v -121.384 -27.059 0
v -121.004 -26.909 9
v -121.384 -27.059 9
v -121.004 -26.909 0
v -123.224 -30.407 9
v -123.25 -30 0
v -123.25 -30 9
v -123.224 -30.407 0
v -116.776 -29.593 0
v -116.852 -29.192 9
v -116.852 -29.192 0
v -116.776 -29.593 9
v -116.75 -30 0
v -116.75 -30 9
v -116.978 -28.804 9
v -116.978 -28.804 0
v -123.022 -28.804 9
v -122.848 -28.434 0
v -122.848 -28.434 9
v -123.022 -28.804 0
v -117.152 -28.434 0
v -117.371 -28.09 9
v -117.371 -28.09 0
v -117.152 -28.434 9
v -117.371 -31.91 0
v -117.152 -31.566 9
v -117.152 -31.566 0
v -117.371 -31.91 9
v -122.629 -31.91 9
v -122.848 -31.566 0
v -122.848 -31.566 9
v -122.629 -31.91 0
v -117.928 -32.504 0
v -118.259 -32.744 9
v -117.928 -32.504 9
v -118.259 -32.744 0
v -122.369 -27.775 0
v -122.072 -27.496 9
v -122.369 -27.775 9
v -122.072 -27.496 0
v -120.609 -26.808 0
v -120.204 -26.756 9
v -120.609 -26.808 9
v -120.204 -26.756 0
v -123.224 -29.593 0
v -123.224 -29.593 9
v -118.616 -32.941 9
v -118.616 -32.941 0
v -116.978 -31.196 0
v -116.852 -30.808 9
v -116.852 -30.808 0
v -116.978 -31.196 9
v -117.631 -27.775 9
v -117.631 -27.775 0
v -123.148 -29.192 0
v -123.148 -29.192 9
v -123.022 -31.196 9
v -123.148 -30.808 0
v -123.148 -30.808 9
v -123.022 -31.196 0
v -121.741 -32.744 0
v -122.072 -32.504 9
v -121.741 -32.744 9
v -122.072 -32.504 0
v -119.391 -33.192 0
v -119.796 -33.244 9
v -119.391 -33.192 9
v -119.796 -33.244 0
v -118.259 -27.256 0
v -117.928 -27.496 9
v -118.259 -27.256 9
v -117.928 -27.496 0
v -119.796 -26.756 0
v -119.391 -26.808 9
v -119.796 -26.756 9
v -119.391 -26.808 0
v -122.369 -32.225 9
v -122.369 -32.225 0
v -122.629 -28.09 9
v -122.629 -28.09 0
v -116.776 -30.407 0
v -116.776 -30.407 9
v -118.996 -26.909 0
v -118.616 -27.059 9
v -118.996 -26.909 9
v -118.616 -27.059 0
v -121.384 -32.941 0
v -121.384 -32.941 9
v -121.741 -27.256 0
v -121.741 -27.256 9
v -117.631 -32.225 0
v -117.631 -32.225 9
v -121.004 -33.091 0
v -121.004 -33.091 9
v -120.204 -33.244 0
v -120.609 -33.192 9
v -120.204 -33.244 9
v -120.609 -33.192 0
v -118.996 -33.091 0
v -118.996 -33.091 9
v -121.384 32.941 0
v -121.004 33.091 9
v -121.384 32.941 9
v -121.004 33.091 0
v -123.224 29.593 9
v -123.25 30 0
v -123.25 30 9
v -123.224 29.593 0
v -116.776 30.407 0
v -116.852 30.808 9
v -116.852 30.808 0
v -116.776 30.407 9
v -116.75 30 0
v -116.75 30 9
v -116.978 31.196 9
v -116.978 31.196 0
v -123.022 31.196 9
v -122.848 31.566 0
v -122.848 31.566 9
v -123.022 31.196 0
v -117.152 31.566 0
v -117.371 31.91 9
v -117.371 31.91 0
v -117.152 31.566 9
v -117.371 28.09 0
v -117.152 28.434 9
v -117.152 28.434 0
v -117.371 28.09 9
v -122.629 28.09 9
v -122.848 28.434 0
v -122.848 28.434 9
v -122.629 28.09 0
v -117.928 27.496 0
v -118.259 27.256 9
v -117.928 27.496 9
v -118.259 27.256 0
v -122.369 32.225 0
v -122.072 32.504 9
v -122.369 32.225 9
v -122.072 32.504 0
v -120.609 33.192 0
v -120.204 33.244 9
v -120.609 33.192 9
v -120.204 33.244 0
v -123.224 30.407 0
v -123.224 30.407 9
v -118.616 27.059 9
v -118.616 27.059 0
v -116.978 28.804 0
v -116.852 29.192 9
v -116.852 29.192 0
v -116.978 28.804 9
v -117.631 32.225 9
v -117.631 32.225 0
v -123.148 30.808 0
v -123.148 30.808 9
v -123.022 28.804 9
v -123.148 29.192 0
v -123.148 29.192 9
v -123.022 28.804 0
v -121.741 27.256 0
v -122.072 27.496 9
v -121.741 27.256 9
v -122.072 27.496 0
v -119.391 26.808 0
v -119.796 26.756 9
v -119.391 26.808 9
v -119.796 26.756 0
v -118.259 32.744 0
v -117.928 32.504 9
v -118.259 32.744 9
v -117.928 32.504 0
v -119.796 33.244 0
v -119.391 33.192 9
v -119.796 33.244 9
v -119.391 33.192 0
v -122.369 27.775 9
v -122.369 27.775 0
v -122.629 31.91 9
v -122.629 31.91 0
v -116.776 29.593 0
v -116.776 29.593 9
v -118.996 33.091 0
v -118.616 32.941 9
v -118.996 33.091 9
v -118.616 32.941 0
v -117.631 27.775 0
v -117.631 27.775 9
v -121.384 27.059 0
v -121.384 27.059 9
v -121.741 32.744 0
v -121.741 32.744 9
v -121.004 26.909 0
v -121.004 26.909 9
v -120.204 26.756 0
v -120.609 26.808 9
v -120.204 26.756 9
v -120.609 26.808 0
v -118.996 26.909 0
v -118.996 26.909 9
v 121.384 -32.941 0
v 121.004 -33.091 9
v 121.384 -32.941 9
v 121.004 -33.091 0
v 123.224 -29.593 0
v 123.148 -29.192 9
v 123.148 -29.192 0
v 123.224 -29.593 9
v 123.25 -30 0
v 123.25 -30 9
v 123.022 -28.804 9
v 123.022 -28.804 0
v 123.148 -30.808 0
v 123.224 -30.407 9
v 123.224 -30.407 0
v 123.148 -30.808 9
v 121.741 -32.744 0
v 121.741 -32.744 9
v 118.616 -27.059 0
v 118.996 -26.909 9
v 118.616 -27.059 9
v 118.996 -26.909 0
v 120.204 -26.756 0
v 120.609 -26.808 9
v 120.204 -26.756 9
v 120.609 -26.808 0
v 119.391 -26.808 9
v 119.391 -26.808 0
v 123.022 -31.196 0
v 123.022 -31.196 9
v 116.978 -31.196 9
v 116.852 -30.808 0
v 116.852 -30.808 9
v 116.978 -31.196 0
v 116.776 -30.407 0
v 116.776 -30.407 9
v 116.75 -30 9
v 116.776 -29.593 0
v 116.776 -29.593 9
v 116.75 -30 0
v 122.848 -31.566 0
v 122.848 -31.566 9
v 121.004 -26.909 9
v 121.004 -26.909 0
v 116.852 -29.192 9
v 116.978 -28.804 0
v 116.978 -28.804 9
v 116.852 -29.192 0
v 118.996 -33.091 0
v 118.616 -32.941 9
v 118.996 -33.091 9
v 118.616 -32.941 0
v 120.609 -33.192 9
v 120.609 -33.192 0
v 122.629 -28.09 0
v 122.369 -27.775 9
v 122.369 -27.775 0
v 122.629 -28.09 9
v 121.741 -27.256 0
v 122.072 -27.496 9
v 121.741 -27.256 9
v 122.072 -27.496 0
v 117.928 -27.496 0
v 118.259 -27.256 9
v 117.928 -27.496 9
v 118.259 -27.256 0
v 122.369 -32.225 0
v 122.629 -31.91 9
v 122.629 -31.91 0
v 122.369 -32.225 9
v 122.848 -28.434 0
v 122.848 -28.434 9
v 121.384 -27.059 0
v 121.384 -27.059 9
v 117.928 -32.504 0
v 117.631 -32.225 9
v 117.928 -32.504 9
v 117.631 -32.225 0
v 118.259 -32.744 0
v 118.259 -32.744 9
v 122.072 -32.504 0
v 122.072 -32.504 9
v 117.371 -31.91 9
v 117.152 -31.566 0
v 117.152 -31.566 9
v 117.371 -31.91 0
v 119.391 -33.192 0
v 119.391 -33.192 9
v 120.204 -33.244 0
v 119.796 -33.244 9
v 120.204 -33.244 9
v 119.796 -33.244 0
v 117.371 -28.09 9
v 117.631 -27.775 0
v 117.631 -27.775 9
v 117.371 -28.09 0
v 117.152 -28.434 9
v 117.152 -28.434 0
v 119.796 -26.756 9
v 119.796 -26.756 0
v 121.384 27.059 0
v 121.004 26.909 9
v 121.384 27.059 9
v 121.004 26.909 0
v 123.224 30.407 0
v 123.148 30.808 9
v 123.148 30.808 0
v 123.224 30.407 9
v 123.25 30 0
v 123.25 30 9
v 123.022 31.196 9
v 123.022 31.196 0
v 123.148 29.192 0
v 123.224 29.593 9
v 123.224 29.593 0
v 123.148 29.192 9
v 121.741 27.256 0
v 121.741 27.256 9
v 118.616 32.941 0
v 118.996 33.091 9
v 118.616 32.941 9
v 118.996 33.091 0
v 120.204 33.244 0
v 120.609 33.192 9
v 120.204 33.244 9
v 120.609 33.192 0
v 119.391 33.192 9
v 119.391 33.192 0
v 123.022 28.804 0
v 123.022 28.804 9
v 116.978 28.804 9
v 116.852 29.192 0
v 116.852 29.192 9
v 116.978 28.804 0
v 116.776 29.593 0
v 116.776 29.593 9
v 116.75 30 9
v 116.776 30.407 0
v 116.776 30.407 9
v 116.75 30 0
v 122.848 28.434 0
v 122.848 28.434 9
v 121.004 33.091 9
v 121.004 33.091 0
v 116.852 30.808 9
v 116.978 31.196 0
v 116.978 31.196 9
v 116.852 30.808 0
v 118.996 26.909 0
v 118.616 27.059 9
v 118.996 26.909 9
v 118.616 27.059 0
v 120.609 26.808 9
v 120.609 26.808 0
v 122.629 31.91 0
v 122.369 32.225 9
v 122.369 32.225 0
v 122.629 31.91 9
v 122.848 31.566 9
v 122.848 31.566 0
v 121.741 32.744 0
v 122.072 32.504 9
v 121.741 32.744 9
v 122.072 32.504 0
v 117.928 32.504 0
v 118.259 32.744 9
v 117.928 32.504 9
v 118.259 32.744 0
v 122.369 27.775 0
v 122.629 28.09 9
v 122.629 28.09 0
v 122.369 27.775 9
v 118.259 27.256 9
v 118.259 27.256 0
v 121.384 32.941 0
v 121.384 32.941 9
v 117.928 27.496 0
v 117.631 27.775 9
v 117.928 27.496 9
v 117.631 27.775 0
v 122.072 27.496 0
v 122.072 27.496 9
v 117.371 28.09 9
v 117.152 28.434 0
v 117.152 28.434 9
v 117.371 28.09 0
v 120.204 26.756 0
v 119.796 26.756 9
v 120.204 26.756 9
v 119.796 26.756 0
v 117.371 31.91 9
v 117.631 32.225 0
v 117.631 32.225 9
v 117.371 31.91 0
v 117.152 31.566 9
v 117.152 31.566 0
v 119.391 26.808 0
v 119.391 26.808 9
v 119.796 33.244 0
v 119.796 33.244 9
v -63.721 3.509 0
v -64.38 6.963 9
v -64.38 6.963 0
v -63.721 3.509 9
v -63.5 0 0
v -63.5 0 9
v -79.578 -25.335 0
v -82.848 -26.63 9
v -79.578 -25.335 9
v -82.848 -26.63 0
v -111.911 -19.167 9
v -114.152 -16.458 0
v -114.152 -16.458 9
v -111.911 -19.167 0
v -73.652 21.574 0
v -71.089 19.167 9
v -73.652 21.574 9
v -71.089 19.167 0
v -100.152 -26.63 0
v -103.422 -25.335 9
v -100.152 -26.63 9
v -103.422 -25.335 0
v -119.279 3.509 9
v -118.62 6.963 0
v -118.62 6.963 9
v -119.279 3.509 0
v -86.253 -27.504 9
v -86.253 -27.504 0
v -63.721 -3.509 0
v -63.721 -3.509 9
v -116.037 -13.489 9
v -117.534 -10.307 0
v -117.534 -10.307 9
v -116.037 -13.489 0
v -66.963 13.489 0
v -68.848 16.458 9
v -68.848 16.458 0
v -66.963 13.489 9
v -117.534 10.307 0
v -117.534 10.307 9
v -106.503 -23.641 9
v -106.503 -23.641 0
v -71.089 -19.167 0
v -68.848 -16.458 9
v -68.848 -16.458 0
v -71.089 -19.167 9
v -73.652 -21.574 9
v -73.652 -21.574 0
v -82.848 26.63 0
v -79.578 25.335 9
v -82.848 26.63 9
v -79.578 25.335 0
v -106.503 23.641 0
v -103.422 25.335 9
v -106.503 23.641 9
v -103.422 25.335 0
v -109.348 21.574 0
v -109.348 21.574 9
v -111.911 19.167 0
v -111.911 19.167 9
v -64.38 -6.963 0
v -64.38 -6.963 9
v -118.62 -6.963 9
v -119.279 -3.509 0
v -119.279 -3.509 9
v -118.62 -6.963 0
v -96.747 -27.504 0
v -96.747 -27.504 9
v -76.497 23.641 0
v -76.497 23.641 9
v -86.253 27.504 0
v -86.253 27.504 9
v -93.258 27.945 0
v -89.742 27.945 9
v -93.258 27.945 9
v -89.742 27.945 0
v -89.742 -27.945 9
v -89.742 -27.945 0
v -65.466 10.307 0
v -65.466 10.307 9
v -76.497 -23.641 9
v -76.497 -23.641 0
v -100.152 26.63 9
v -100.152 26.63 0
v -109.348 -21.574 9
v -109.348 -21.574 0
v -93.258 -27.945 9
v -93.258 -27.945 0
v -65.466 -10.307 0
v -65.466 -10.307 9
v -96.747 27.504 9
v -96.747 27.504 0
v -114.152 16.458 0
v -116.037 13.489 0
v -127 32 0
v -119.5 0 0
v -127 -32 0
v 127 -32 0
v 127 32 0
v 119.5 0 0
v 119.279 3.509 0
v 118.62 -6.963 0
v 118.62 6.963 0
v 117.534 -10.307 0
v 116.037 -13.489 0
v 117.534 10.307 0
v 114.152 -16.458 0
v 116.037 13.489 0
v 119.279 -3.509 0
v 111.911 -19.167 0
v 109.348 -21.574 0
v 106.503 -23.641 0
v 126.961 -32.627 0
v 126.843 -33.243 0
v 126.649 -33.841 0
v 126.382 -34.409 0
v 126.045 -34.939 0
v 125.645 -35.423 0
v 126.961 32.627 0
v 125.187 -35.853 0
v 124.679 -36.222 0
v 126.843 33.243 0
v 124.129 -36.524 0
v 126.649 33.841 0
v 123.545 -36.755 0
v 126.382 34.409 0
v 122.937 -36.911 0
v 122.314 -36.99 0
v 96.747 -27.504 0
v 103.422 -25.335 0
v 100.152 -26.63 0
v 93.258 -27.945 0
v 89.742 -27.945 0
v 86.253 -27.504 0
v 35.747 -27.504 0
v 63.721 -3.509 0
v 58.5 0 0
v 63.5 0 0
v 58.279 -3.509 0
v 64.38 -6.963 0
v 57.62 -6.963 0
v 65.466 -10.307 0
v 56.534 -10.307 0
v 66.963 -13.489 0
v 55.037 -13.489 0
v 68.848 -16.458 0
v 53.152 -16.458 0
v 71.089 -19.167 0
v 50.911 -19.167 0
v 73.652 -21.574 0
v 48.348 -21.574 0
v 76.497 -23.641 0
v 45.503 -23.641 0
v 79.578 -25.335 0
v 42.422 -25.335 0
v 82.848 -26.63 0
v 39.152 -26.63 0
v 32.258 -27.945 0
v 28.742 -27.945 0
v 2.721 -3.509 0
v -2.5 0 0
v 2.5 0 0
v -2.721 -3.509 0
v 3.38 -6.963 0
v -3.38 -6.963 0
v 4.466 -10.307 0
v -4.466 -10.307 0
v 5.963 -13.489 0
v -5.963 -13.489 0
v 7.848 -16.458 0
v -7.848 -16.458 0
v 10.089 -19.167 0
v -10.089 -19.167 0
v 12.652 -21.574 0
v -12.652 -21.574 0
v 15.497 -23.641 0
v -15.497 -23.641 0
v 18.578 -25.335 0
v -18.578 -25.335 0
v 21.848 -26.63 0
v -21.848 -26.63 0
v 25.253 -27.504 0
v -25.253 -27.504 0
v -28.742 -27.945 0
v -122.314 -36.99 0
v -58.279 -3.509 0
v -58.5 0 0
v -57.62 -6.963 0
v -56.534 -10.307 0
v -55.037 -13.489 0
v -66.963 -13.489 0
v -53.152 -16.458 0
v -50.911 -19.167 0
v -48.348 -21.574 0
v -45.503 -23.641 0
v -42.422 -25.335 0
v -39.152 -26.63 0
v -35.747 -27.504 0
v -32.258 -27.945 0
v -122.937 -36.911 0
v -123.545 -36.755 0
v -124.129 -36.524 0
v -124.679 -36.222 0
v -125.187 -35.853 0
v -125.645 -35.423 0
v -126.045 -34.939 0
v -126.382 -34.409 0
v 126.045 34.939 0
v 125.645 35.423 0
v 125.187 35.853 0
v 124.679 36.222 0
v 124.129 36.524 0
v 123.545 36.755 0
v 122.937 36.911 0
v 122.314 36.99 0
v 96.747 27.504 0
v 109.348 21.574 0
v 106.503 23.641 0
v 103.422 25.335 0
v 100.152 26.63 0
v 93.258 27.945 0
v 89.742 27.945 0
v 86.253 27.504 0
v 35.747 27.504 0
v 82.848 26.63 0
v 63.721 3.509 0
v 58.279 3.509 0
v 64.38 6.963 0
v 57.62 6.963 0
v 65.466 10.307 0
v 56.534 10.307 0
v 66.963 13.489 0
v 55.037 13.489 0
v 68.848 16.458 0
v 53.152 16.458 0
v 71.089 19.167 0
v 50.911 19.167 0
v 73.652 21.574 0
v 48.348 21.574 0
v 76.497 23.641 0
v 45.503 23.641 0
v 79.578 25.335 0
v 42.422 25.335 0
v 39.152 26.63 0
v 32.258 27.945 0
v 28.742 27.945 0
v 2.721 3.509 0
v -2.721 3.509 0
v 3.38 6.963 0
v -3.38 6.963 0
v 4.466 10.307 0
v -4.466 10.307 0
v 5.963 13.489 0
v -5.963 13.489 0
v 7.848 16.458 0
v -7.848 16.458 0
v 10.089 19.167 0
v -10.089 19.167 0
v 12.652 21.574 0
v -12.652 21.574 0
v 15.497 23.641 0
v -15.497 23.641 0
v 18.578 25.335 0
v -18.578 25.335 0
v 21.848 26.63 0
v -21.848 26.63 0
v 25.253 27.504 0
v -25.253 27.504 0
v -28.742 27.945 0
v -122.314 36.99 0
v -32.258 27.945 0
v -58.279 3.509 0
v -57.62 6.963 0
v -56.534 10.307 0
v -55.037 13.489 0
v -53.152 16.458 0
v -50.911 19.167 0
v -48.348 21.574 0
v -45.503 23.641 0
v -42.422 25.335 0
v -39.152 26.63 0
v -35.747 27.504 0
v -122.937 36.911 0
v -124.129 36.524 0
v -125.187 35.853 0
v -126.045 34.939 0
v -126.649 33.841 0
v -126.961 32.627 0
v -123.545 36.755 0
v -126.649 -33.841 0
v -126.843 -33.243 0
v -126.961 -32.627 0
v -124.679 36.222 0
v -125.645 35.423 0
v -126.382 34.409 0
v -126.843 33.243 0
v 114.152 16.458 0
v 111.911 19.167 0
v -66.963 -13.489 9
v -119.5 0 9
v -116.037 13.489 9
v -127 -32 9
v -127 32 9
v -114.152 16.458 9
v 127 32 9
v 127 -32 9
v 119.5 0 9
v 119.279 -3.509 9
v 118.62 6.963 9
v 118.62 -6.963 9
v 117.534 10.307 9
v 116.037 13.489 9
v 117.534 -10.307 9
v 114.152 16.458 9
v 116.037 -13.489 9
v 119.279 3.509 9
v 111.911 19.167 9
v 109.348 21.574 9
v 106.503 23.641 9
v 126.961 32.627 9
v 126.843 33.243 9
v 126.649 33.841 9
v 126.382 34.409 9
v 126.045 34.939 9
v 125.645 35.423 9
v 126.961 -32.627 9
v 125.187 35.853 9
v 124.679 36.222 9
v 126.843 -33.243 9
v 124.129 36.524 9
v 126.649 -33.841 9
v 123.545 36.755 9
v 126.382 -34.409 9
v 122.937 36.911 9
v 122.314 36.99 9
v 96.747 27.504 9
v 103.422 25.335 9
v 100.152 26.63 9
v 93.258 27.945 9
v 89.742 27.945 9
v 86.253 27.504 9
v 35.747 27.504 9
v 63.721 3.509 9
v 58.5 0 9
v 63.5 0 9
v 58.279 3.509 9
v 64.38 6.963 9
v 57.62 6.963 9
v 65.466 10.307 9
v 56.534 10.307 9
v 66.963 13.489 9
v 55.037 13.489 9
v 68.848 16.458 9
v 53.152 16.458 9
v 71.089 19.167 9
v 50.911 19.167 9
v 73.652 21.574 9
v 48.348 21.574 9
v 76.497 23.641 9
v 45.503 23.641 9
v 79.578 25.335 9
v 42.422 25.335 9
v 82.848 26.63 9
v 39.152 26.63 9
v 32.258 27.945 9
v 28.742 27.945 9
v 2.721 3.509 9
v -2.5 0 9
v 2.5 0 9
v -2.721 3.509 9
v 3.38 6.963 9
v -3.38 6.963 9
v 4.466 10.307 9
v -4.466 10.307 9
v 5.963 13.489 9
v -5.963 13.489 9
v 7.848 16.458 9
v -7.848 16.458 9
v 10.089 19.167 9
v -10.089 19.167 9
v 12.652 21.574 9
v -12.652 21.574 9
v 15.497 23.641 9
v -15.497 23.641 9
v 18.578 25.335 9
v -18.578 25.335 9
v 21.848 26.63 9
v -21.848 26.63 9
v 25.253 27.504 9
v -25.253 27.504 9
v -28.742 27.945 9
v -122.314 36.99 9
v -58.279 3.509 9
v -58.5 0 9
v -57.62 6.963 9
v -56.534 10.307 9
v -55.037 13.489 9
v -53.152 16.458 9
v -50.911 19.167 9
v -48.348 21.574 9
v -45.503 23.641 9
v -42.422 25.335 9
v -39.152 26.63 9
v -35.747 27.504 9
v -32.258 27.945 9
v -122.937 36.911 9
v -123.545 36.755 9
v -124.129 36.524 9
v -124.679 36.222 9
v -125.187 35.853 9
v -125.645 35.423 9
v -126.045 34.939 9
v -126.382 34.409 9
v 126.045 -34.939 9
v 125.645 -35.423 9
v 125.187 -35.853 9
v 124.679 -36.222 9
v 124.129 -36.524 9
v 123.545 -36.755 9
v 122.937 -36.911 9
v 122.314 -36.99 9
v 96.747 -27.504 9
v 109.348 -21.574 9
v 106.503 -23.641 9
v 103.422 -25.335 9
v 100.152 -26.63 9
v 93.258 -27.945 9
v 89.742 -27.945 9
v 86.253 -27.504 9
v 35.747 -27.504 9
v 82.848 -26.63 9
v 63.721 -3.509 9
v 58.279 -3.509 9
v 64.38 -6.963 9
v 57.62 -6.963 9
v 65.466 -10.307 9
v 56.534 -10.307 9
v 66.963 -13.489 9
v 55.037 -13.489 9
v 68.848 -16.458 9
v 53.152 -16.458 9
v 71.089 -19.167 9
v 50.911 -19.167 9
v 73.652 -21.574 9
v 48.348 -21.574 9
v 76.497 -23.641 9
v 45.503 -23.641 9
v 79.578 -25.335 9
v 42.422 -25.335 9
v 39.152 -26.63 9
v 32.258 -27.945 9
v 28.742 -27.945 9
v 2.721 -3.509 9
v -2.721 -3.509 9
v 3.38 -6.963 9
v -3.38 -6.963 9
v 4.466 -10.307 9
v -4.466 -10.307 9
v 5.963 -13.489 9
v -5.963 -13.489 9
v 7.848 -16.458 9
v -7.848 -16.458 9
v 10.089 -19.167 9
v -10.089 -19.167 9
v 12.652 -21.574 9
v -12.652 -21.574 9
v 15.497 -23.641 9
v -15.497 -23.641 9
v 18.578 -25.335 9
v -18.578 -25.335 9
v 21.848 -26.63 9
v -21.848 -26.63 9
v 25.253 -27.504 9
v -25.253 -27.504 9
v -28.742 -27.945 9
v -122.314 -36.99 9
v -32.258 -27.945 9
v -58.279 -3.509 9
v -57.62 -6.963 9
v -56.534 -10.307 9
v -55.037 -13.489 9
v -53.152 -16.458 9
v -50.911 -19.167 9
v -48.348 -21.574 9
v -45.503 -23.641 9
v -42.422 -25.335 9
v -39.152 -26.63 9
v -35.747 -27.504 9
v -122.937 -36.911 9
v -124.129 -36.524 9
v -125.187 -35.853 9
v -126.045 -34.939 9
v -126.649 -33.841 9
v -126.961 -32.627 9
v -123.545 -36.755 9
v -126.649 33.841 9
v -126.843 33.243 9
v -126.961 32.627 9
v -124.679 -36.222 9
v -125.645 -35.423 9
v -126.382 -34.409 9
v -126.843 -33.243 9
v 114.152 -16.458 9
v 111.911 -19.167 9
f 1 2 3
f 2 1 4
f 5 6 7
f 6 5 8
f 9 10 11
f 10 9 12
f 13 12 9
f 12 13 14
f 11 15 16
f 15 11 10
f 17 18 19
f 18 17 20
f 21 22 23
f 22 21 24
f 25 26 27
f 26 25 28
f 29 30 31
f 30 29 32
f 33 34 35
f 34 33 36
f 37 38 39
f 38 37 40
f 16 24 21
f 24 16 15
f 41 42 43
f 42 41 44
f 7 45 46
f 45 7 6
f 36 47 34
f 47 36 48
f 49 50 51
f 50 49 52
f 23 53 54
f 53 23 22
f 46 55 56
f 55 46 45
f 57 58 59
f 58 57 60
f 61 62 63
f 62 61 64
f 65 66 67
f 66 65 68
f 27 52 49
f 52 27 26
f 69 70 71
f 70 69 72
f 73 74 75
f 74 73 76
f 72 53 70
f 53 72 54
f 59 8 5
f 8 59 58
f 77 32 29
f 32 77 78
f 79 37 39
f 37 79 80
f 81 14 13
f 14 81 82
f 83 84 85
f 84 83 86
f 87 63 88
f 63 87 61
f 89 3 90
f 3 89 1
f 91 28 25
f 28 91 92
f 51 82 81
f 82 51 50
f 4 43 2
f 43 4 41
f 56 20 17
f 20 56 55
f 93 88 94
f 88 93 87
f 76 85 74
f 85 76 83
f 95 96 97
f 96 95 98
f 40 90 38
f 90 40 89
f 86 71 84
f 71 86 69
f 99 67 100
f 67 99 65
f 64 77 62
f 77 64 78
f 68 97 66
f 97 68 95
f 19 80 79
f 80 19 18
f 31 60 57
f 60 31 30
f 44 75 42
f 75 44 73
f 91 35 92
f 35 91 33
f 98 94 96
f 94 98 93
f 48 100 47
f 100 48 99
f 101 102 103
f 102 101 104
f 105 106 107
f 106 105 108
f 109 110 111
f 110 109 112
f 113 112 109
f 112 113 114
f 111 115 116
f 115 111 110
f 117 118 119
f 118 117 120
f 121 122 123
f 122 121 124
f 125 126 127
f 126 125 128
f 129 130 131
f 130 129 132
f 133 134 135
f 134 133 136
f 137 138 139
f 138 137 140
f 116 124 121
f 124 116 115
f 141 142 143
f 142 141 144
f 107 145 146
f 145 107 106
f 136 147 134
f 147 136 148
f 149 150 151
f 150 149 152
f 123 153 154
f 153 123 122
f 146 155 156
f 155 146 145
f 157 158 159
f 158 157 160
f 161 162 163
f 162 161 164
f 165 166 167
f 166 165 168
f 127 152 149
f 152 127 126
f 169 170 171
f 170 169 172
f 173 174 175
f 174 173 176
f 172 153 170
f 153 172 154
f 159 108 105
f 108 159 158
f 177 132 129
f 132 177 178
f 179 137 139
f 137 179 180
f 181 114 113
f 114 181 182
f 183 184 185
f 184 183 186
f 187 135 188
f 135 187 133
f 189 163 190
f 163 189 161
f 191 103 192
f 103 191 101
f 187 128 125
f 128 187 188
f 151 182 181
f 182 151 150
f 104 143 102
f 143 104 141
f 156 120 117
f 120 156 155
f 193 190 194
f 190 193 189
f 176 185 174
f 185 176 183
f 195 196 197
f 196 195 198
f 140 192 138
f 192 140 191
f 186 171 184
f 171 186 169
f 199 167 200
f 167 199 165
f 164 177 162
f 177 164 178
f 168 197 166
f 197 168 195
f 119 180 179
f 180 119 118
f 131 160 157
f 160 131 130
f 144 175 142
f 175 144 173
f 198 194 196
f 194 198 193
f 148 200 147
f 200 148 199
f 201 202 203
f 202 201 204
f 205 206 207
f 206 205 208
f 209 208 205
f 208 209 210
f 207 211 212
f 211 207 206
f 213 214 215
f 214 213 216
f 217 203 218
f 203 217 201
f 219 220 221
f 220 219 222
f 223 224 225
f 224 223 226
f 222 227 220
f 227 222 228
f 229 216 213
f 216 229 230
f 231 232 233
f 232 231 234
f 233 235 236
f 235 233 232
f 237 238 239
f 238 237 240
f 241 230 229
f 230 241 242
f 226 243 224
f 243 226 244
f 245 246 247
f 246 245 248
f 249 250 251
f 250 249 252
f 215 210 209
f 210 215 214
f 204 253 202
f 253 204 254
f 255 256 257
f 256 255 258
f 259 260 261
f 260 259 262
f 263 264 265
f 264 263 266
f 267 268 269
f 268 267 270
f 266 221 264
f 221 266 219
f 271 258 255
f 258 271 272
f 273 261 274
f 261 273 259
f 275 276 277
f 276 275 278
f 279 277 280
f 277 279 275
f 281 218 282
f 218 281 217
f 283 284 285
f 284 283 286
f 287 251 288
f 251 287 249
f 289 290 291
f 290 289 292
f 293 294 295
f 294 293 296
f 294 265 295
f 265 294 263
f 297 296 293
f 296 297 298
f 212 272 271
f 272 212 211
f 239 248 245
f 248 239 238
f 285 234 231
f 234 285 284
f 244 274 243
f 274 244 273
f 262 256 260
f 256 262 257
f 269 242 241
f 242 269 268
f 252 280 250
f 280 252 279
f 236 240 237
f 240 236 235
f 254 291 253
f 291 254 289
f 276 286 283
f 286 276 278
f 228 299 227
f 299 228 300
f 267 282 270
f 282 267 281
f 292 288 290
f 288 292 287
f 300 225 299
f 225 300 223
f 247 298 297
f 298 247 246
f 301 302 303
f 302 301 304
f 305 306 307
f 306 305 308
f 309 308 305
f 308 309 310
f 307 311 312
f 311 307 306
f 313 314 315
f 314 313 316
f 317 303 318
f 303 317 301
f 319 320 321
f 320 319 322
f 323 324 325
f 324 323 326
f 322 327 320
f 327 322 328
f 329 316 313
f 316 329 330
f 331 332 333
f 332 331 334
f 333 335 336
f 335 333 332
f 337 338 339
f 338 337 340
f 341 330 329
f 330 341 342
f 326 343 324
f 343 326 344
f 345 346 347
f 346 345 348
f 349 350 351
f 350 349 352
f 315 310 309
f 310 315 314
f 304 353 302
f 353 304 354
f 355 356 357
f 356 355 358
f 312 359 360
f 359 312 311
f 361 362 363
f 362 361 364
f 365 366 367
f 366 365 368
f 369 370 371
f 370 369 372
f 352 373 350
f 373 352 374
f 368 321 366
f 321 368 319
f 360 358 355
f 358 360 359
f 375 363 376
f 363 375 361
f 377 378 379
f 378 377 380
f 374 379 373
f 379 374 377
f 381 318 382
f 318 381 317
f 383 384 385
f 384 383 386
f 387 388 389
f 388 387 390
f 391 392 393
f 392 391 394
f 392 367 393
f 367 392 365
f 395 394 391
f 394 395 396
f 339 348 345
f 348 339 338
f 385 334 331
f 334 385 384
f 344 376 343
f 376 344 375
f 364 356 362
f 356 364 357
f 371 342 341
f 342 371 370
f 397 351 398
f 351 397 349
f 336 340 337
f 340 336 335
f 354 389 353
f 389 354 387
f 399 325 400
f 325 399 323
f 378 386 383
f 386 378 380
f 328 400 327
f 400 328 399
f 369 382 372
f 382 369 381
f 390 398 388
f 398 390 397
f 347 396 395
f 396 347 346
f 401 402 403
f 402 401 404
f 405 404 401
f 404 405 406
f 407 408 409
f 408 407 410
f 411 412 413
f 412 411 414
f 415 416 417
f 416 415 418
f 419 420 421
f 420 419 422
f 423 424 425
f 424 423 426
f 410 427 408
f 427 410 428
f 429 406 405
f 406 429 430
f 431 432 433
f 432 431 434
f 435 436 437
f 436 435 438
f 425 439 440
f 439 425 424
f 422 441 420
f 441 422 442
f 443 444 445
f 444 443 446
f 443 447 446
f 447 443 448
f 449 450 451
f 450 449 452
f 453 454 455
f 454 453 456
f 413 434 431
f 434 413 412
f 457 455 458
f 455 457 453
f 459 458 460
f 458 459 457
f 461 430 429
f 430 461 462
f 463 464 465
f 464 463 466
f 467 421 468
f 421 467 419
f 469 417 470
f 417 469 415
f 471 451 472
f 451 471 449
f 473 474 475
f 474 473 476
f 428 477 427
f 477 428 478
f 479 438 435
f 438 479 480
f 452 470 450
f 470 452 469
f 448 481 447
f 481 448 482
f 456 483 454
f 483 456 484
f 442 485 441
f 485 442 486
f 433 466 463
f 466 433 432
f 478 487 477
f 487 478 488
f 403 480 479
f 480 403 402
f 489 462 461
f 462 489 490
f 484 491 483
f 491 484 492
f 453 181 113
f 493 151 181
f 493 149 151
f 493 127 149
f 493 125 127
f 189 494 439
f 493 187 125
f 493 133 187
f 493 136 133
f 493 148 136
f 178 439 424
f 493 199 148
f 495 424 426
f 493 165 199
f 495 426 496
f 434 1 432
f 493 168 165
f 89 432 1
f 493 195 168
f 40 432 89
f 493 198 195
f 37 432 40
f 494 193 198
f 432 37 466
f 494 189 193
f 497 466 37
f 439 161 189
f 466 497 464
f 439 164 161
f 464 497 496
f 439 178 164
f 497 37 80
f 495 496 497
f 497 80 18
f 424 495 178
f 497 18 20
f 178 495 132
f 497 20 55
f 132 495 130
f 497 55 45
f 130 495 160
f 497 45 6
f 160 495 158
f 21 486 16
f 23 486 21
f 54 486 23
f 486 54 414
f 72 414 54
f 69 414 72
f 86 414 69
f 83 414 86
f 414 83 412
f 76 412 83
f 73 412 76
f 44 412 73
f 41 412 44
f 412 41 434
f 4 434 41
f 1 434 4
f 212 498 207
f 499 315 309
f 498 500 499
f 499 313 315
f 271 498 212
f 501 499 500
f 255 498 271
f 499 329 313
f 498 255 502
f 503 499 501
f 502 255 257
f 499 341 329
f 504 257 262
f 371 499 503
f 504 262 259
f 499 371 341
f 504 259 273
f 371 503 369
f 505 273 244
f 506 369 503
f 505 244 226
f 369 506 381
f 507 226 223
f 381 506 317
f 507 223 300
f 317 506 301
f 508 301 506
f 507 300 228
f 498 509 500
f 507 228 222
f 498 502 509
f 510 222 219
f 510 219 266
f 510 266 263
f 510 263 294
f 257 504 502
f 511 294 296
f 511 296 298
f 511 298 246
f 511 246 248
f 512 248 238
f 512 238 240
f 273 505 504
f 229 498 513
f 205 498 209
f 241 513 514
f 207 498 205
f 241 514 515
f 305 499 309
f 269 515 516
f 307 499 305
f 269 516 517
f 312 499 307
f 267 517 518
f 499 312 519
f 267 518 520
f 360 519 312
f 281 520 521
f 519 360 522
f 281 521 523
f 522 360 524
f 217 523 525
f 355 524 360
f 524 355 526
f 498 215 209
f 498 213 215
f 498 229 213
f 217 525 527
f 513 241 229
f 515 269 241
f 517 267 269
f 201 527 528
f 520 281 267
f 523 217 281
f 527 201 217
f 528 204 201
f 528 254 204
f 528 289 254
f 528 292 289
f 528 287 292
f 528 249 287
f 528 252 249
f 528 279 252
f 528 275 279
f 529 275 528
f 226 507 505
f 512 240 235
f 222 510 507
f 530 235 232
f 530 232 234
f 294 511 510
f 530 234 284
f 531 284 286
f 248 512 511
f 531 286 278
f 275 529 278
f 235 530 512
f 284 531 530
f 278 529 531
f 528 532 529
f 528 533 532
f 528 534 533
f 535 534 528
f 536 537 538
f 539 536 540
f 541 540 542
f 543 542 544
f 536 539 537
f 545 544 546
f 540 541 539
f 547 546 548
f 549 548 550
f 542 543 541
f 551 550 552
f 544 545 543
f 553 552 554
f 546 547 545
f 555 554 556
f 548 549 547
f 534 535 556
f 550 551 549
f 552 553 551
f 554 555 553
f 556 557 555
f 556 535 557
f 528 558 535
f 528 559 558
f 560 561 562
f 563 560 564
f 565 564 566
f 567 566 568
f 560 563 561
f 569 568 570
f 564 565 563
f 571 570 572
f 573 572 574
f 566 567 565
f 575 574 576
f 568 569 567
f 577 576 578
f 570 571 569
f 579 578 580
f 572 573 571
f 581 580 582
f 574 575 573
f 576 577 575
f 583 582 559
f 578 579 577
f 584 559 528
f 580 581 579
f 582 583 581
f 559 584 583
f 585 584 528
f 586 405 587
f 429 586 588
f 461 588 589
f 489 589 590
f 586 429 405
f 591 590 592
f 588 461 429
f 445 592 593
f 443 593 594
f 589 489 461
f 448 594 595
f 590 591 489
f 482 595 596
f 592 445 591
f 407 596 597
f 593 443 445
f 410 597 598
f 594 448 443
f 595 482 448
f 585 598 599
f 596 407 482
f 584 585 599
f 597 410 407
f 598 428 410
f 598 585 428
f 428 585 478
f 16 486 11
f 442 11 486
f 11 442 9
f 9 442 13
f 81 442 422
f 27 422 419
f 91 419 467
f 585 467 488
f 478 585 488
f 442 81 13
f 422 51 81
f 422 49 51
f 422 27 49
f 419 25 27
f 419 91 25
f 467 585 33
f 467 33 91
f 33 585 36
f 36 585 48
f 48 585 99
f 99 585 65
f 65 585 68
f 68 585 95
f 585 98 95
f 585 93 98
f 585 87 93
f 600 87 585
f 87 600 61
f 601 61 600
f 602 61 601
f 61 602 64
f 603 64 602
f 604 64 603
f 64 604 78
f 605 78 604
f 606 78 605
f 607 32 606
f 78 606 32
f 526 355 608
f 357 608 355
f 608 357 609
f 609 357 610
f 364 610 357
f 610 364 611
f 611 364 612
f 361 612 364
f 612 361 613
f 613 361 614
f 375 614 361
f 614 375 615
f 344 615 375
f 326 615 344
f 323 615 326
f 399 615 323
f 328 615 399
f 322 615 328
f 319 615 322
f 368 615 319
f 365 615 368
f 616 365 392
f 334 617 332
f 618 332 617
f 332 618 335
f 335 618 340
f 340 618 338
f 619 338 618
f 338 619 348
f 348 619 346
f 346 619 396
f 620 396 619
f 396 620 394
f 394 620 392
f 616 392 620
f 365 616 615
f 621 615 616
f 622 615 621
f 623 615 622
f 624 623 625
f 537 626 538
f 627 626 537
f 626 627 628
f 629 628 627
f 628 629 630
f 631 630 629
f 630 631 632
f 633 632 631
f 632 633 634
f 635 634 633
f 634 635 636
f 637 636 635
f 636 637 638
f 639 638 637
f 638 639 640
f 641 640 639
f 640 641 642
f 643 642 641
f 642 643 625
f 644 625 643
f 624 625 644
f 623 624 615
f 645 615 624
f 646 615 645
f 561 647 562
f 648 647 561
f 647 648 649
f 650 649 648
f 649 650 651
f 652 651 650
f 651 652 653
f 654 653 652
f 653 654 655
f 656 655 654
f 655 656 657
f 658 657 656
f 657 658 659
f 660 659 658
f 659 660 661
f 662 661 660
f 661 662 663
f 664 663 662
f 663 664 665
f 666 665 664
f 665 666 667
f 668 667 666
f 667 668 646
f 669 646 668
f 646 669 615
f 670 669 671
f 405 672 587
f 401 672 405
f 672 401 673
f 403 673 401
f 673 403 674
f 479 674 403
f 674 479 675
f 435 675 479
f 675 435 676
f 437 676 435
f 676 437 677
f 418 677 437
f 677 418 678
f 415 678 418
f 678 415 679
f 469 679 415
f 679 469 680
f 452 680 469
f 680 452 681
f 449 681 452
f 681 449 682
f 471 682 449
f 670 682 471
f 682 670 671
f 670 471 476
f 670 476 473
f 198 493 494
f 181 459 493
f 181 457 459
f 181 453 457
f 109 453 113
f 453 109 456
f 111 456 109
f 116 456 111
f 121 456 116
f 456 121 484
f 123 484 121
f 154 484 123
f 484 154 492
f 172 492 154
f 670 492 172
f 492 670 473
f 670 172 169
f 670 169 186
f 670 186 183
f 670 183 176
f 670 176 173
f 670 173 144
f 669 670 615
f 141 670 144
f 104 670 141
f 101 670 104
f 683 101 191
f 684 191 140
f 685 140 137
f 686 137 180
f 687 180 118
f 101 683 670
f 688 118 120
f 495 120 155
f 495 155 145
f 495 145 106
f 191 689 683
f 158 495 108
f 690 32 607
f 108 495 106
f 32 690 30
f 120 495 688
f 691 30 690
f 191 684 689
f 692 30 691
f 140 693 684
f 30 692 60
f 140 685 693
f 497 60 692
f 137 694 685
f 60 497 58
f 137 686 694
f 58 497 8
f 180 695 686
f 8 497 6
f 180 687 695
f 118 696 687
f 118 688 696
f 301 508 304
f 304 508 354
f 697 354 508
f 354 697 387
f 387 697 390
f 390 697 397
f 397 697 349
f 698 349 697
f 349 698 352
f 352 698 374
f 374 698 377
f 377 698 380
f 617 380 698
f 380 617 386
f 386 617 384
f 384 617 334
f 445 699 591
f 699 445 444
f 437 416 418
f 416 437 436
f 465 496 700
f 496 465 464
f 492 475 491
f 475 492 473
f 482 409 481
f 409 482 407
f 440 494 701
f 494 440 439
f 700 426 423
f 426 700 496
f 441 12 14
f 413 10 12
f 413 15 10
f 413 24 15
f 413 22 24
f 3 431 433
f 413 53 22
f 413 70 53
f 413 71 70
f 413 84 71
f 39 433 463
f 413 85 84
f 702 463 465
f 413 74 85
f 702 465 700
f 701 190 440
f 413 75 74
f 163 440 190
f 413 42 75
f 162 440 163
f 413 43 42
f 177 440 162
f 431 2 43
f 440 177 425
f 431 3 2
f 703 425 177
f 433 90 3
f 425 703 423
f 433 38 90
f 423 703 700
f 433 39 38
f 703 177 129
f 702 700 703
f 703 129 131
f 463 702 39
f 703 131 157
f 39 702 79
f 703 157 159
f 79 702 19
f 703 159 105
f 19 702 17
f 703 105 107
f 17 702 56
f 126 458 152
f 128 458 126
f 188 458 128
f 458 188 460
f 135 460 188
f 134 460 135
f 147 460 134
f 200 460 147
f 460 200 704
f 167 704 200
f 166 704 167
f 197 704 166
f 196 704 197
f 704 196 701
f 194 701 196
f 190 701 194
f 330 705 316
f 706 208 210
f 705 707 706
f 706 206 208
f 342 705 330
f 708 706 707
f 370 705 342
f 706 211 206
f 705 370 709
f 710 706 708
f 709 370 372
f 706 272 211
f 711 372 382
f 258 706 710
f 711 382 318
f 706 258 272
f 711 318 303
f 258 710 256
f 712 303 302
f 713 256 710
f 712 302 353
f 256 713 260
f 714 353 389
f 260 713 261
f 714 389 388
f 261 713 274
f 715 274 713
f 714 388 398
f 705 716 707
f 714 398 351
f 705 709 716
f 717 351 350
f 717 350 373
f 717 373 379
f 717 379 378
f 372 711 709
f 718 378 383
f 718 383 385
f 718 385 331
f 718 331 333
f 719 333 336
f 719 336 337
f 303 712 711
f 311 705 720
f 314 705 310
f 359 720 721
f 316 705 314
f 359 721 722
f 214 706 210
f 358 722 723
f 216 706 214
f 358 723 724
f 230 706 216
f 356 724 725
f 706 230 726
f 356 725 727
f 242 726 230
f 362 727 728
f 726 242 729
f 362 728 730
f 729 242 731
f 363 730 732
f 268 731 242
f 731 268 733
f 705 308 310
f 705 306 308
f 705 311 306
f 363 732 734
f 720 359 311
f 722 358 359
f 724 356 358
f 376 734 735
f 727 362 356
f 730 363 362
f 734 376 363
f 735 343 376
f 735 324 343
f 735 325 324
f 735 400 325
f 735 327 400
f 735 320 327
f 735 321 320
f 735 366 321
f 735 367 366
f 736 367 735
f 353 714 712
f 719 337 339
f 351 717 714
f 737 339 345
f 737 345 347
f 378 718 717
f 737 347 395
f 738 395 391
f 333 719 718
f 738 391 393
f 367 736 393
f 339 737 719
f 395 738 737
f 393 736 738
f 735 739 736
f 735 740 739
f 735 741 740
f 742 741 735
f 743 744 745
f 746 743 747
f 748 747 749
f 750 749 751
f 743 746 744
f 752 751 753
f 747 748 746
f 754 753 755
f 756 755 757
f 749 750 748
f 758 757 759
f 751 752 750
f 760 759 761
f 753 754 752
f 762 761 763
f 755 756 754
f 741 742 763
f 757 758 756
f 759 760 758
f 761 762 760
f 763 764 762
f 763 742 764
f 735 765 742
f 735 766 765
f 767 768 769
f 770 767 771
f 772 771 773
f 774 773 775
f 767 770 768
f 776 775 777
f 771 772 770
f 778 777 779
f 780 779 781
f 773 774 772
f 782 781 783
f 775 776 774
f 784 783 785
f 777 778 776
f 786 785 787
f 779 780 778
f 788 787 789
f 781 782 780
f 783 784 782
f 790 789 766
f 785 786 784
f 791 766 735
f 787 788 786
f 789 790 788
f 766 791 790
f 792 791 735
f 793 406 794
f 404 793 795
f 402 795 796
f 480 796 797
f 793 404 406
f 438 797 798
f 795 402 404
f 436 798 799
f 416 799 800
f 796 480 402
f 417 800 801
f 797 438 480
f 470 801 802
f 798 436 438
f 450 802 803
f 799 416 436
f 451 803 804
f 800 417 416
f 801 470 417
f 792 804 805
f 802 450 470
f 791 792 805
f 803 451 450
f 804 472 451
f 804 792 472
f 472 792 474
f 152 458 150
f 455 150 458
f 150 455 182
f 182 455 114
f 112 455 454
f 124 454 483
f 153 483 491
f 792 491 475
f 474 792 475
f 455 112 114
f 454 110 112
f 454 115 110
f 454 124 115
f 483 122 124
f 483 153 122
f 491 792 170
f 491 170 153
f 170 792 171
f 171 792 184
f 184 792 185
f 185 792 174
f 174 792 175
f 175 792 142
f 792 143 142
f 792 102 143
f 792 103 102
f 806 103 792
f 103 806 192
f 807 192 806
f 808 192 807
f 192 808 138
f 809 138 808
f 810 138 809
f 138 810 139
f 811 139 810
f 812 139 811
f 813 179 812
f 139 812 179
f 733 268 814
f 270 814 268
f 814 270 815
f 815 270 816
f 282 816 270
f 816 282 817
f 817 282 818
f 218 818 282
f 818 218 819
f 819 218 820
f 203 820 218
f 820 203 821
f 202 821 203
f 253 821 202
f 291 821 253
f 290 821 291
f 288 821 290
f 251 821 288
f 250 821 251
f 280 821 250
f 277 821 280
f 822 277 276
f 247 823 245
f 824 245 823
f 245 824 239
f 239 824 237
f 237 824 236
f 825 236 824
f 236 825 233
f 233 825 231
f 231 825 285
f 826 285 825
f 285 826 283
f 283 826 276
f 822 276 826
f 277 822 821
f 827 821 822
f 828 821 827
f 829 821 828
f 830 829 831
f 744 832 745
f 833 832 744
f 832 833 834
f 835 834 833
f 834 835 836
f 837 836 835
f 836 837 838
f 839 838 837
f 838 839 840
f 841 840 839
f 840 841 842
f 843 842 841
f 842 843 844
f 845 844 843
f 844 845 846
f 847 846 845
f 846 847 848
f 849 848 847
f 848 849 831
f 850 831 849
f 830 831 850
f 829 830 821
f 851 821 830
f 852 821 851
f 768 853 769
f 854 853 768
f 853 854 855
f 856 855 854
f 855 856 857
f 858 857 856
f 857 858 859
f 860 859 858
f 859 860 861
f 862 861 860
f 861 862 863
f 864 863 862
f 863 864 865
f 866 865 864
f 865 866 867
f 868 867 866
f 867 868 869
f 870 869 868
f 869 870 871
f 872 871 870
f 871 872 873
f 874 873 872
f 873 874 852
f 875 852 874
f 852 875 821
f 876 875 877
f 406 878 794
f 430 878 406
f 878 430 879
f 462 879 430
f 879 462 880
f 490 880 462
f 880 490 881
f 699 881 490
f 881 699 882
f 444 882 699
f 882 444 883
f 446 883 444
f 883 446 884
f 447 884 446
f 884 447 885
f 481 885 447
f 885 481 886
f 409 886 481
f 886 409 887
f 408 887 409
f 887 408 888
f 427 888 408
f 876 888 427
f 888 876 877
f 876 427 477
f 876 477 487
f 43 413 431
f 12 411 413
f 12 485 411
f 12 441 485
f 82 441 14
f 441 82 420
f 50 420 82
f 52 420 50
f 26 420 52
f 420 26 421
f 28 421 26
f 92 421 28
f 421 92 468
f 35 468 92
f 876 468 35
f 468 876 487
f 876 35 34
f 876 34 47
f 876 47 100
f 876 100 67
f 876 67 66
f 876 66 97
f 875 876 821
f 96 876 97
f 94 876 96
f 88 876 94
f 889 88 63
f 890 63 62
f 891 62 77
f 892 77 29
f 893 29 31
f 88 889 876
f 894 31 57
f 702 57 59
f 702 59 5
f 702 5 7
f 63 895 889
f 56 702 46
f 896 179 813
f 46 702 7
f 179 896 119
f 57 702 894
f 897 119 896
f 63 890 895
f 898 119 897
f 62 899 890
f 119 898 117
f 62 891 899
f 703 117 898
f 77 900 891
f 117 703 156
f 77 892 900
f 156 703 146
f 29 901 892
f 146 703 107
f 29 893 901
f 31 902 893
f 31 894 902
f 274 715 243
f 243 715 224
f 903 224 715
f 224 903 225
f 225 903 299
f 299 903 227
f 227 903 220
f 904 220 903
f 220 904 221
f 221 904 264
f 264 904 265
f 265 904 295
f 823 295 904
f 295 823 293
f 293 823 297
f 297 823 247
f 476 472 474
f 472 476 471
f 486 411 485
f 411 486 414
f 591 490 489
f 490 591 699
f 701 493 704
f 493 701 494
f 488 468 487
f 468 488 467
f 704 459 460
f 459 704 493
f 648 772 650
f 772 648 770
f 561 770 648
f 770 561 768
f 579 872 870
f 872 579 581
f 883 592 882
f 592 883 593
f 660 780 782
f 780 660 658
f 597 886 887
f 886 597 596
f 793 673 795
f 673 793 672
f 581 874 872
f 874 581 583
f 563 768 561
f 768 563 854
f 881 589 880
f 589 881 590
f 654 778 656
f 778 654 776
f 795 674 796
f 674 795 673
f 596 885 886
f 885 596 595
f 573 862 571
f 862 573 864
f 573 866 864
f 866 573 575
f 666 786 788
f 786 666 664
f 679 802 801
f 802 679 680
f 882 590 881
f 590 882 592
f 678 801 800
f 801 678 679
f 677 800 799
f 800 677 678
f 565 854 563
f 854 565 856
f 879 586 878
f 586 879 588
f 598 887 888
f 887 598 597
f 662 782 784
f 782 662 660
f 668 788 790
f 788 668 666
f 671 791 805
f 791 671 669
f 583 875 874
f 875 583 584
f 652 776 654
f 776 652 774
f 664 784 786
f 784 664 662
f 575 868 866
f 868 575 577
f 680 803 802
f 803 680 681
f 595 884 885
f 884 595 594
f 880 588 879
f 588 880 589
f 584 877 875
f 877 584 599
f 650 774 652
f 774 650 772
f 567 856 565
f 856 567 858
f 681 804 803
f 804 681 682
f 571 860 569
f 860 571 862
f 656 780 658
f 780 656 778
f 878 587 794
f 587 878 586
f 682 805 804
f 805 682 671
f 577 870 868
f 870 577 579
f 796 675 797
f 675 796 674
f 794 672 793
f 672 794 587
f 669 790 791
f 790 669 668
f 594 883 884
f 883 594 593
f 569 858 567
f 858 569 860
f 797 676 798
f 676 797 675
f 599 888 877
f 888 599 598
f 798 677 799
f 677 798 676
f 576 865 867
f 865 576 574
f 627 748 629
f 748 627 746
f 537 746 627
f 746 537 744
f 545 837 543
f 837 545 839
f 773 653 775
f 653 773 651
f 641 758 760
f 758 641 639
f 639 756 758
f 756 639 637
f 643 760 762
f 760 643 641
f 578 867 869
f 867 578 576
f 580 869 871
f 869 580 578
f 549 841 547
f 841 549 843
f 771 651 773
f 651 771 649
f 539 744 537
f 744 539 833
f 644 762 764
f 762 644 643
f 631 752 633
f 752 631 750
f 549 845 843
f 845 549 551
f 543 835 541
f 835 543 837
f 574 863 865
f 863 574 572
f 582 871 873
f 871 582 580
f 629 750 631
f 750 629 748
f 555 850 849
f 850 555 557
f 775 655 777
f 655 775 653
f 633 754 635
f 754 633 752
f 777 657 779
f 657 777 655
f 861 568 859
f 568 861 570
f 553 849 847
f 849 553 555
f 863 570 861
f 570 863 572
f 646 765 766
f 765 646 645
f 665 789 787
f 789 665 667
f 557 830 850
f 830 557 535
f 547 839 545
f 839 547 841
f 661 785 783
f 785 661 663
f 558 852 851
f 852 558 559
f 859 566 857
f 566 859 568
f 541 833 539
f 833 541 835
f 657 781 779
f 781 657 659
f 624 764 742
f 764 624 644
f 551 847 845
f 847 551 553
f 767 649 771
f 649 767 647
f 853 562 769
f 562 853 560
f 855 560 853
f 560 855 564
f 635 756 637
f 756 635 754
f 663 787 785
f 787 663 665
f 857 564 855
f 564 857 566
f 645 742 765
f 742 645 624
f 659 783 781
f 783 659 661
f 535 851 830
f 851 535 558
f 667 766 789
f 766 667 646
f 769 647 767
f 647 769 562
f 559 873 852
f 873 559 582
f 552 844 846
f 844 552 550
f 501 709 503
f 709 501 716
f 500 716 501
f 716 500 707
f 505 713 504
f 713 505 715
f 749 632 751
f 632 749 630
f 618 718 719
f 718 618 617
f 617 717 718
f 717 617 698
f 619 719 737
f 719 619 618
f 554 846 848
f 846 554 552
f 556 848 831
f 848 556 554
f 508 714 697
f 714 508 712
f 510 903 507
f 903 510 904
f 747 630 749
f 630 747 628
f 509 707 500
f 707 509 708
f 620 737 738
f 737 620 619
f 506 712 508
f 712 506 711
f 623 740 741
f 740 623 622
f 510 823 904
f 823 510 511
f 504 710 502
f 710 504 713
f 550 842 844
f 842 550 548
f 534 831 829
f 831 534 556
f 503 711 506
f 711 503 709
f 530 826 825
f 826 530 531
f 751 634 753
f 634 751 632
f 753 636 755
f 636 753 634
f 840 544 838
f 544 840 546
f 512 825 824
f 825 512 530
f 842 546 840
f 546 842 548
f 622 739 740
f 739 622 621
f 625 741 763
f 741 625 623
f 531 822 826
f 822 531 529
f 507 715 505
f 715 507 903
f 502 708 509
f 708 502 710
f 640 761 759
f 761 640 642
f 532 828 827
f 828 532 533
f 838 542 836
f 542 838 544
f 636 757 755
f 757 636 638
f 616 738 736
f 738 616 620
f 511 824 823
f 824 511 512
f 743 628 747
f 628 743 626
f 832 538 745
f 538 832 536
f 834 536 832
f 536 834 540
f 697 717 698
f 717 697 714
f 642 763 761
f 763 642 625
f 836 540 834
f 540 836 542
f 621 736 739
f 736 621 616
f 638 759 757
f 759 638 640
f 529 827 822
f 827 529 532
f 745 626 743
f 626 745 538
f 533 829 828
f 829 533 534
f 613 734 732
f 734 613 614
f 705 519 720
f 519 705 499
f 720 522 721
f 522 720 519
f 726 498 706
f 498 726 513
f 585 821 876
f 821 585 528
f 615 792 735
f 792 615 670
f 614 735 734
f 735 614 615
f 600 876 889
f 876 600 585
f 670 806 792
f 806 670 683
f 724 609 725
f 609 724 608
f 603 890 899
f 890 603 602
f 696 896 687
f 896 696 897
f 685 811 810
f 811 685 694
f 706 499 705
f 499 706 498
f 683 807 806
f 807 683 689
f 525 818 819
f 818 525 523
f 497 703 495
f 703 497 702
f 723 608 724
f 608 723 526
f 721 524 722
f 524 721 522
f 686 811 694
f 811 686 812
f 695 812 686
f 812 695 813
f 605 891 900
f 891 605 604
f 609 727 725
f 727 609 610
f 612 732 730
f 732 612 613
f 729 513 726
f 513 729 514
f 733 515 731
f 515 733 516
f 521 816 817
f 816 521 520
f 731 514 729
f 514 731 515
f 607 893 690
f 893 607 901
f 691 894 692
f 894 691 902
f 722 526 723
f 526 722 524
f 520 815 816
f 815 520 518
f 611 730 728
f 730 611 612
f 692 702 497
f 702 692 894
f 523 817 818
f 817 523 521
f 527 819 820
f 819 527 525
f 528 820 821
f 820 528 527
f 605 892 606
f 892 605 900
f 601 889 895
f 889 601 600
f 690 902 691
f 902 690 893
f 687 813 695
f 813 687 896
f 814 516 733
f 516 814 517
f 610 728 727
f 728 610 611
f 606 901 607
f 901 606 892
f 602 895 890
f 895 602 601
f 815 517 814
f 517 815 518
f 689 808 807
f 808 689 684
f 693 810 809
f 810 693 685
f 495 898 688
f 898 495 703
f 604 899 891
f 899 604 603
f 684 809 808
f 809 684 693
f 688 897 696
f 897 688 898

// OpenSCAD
$fn = 50;

difference() {
	union() {
		hull() {
			translate(v = [-122.0, 32.0, 0]) {
				cylinder(h = 9, r = 5);
			}
			translate(v = [122.0, 32.0, 0]) {
				cylinder(h = 9, r = 5);
			}
			translate(v = [-122.0, -32.0, 0]) {
				cylinder(h = 9, r = 5);
			}
			translate(v = [122.0, -32.0, 0]) {
				cylinder(h = 9, r = 5);
			}
		}
	}
	union() {
		translate(v = [-120.0, -30.0, -100.0]) {
			cylinder(h = 200, r = 3.25);
		}
		translate(v = [-120.0, 30.0, -100.0]) {
			cylinder(h = 200, r = 3.25);
		}
		translate(v = [120.0, -30.0, -100.0]) {
			cylinder(h = 200, r = 3.25);
		}
		translate(v = [120.0, 30.0, -100.0]) {
			cylinder(h = 200, r = 3.25);
		}
		translate(v = [-120.0, -30.0, -100.0]) {
			cylinder(h = 200, r = 1.8);
		}
		translate(v = [-120.0, 30.0, -100.0]) {
			cylinder(h = 200, r = 1.8);
		}
		translate(v = [120.0, -30.0, -100.0]) {
			cylinder(h = 200, r = 1.8);
		}
		translate(v = [120.0, 30.0, -100.0]) {
			cylinder(h = 200, r = 1.8);
		}
		translate(v = [-91.5, 0, 0.0]) {
			cylinder(h = 9, r = 28.0);
		}
		translate(v = [-30.5, 0, 0.0]) {
			cylinder(h = 9, r = 28.0);
		}
		translate(v = [30.5, 0, 0.0]) {
			cylinder(h = 9, r = 28.0);
		}
		translate(v = [91.5, 0, 0.0]) {
			cylinder(h = 9, r = 28.0);
		}
	}
}
